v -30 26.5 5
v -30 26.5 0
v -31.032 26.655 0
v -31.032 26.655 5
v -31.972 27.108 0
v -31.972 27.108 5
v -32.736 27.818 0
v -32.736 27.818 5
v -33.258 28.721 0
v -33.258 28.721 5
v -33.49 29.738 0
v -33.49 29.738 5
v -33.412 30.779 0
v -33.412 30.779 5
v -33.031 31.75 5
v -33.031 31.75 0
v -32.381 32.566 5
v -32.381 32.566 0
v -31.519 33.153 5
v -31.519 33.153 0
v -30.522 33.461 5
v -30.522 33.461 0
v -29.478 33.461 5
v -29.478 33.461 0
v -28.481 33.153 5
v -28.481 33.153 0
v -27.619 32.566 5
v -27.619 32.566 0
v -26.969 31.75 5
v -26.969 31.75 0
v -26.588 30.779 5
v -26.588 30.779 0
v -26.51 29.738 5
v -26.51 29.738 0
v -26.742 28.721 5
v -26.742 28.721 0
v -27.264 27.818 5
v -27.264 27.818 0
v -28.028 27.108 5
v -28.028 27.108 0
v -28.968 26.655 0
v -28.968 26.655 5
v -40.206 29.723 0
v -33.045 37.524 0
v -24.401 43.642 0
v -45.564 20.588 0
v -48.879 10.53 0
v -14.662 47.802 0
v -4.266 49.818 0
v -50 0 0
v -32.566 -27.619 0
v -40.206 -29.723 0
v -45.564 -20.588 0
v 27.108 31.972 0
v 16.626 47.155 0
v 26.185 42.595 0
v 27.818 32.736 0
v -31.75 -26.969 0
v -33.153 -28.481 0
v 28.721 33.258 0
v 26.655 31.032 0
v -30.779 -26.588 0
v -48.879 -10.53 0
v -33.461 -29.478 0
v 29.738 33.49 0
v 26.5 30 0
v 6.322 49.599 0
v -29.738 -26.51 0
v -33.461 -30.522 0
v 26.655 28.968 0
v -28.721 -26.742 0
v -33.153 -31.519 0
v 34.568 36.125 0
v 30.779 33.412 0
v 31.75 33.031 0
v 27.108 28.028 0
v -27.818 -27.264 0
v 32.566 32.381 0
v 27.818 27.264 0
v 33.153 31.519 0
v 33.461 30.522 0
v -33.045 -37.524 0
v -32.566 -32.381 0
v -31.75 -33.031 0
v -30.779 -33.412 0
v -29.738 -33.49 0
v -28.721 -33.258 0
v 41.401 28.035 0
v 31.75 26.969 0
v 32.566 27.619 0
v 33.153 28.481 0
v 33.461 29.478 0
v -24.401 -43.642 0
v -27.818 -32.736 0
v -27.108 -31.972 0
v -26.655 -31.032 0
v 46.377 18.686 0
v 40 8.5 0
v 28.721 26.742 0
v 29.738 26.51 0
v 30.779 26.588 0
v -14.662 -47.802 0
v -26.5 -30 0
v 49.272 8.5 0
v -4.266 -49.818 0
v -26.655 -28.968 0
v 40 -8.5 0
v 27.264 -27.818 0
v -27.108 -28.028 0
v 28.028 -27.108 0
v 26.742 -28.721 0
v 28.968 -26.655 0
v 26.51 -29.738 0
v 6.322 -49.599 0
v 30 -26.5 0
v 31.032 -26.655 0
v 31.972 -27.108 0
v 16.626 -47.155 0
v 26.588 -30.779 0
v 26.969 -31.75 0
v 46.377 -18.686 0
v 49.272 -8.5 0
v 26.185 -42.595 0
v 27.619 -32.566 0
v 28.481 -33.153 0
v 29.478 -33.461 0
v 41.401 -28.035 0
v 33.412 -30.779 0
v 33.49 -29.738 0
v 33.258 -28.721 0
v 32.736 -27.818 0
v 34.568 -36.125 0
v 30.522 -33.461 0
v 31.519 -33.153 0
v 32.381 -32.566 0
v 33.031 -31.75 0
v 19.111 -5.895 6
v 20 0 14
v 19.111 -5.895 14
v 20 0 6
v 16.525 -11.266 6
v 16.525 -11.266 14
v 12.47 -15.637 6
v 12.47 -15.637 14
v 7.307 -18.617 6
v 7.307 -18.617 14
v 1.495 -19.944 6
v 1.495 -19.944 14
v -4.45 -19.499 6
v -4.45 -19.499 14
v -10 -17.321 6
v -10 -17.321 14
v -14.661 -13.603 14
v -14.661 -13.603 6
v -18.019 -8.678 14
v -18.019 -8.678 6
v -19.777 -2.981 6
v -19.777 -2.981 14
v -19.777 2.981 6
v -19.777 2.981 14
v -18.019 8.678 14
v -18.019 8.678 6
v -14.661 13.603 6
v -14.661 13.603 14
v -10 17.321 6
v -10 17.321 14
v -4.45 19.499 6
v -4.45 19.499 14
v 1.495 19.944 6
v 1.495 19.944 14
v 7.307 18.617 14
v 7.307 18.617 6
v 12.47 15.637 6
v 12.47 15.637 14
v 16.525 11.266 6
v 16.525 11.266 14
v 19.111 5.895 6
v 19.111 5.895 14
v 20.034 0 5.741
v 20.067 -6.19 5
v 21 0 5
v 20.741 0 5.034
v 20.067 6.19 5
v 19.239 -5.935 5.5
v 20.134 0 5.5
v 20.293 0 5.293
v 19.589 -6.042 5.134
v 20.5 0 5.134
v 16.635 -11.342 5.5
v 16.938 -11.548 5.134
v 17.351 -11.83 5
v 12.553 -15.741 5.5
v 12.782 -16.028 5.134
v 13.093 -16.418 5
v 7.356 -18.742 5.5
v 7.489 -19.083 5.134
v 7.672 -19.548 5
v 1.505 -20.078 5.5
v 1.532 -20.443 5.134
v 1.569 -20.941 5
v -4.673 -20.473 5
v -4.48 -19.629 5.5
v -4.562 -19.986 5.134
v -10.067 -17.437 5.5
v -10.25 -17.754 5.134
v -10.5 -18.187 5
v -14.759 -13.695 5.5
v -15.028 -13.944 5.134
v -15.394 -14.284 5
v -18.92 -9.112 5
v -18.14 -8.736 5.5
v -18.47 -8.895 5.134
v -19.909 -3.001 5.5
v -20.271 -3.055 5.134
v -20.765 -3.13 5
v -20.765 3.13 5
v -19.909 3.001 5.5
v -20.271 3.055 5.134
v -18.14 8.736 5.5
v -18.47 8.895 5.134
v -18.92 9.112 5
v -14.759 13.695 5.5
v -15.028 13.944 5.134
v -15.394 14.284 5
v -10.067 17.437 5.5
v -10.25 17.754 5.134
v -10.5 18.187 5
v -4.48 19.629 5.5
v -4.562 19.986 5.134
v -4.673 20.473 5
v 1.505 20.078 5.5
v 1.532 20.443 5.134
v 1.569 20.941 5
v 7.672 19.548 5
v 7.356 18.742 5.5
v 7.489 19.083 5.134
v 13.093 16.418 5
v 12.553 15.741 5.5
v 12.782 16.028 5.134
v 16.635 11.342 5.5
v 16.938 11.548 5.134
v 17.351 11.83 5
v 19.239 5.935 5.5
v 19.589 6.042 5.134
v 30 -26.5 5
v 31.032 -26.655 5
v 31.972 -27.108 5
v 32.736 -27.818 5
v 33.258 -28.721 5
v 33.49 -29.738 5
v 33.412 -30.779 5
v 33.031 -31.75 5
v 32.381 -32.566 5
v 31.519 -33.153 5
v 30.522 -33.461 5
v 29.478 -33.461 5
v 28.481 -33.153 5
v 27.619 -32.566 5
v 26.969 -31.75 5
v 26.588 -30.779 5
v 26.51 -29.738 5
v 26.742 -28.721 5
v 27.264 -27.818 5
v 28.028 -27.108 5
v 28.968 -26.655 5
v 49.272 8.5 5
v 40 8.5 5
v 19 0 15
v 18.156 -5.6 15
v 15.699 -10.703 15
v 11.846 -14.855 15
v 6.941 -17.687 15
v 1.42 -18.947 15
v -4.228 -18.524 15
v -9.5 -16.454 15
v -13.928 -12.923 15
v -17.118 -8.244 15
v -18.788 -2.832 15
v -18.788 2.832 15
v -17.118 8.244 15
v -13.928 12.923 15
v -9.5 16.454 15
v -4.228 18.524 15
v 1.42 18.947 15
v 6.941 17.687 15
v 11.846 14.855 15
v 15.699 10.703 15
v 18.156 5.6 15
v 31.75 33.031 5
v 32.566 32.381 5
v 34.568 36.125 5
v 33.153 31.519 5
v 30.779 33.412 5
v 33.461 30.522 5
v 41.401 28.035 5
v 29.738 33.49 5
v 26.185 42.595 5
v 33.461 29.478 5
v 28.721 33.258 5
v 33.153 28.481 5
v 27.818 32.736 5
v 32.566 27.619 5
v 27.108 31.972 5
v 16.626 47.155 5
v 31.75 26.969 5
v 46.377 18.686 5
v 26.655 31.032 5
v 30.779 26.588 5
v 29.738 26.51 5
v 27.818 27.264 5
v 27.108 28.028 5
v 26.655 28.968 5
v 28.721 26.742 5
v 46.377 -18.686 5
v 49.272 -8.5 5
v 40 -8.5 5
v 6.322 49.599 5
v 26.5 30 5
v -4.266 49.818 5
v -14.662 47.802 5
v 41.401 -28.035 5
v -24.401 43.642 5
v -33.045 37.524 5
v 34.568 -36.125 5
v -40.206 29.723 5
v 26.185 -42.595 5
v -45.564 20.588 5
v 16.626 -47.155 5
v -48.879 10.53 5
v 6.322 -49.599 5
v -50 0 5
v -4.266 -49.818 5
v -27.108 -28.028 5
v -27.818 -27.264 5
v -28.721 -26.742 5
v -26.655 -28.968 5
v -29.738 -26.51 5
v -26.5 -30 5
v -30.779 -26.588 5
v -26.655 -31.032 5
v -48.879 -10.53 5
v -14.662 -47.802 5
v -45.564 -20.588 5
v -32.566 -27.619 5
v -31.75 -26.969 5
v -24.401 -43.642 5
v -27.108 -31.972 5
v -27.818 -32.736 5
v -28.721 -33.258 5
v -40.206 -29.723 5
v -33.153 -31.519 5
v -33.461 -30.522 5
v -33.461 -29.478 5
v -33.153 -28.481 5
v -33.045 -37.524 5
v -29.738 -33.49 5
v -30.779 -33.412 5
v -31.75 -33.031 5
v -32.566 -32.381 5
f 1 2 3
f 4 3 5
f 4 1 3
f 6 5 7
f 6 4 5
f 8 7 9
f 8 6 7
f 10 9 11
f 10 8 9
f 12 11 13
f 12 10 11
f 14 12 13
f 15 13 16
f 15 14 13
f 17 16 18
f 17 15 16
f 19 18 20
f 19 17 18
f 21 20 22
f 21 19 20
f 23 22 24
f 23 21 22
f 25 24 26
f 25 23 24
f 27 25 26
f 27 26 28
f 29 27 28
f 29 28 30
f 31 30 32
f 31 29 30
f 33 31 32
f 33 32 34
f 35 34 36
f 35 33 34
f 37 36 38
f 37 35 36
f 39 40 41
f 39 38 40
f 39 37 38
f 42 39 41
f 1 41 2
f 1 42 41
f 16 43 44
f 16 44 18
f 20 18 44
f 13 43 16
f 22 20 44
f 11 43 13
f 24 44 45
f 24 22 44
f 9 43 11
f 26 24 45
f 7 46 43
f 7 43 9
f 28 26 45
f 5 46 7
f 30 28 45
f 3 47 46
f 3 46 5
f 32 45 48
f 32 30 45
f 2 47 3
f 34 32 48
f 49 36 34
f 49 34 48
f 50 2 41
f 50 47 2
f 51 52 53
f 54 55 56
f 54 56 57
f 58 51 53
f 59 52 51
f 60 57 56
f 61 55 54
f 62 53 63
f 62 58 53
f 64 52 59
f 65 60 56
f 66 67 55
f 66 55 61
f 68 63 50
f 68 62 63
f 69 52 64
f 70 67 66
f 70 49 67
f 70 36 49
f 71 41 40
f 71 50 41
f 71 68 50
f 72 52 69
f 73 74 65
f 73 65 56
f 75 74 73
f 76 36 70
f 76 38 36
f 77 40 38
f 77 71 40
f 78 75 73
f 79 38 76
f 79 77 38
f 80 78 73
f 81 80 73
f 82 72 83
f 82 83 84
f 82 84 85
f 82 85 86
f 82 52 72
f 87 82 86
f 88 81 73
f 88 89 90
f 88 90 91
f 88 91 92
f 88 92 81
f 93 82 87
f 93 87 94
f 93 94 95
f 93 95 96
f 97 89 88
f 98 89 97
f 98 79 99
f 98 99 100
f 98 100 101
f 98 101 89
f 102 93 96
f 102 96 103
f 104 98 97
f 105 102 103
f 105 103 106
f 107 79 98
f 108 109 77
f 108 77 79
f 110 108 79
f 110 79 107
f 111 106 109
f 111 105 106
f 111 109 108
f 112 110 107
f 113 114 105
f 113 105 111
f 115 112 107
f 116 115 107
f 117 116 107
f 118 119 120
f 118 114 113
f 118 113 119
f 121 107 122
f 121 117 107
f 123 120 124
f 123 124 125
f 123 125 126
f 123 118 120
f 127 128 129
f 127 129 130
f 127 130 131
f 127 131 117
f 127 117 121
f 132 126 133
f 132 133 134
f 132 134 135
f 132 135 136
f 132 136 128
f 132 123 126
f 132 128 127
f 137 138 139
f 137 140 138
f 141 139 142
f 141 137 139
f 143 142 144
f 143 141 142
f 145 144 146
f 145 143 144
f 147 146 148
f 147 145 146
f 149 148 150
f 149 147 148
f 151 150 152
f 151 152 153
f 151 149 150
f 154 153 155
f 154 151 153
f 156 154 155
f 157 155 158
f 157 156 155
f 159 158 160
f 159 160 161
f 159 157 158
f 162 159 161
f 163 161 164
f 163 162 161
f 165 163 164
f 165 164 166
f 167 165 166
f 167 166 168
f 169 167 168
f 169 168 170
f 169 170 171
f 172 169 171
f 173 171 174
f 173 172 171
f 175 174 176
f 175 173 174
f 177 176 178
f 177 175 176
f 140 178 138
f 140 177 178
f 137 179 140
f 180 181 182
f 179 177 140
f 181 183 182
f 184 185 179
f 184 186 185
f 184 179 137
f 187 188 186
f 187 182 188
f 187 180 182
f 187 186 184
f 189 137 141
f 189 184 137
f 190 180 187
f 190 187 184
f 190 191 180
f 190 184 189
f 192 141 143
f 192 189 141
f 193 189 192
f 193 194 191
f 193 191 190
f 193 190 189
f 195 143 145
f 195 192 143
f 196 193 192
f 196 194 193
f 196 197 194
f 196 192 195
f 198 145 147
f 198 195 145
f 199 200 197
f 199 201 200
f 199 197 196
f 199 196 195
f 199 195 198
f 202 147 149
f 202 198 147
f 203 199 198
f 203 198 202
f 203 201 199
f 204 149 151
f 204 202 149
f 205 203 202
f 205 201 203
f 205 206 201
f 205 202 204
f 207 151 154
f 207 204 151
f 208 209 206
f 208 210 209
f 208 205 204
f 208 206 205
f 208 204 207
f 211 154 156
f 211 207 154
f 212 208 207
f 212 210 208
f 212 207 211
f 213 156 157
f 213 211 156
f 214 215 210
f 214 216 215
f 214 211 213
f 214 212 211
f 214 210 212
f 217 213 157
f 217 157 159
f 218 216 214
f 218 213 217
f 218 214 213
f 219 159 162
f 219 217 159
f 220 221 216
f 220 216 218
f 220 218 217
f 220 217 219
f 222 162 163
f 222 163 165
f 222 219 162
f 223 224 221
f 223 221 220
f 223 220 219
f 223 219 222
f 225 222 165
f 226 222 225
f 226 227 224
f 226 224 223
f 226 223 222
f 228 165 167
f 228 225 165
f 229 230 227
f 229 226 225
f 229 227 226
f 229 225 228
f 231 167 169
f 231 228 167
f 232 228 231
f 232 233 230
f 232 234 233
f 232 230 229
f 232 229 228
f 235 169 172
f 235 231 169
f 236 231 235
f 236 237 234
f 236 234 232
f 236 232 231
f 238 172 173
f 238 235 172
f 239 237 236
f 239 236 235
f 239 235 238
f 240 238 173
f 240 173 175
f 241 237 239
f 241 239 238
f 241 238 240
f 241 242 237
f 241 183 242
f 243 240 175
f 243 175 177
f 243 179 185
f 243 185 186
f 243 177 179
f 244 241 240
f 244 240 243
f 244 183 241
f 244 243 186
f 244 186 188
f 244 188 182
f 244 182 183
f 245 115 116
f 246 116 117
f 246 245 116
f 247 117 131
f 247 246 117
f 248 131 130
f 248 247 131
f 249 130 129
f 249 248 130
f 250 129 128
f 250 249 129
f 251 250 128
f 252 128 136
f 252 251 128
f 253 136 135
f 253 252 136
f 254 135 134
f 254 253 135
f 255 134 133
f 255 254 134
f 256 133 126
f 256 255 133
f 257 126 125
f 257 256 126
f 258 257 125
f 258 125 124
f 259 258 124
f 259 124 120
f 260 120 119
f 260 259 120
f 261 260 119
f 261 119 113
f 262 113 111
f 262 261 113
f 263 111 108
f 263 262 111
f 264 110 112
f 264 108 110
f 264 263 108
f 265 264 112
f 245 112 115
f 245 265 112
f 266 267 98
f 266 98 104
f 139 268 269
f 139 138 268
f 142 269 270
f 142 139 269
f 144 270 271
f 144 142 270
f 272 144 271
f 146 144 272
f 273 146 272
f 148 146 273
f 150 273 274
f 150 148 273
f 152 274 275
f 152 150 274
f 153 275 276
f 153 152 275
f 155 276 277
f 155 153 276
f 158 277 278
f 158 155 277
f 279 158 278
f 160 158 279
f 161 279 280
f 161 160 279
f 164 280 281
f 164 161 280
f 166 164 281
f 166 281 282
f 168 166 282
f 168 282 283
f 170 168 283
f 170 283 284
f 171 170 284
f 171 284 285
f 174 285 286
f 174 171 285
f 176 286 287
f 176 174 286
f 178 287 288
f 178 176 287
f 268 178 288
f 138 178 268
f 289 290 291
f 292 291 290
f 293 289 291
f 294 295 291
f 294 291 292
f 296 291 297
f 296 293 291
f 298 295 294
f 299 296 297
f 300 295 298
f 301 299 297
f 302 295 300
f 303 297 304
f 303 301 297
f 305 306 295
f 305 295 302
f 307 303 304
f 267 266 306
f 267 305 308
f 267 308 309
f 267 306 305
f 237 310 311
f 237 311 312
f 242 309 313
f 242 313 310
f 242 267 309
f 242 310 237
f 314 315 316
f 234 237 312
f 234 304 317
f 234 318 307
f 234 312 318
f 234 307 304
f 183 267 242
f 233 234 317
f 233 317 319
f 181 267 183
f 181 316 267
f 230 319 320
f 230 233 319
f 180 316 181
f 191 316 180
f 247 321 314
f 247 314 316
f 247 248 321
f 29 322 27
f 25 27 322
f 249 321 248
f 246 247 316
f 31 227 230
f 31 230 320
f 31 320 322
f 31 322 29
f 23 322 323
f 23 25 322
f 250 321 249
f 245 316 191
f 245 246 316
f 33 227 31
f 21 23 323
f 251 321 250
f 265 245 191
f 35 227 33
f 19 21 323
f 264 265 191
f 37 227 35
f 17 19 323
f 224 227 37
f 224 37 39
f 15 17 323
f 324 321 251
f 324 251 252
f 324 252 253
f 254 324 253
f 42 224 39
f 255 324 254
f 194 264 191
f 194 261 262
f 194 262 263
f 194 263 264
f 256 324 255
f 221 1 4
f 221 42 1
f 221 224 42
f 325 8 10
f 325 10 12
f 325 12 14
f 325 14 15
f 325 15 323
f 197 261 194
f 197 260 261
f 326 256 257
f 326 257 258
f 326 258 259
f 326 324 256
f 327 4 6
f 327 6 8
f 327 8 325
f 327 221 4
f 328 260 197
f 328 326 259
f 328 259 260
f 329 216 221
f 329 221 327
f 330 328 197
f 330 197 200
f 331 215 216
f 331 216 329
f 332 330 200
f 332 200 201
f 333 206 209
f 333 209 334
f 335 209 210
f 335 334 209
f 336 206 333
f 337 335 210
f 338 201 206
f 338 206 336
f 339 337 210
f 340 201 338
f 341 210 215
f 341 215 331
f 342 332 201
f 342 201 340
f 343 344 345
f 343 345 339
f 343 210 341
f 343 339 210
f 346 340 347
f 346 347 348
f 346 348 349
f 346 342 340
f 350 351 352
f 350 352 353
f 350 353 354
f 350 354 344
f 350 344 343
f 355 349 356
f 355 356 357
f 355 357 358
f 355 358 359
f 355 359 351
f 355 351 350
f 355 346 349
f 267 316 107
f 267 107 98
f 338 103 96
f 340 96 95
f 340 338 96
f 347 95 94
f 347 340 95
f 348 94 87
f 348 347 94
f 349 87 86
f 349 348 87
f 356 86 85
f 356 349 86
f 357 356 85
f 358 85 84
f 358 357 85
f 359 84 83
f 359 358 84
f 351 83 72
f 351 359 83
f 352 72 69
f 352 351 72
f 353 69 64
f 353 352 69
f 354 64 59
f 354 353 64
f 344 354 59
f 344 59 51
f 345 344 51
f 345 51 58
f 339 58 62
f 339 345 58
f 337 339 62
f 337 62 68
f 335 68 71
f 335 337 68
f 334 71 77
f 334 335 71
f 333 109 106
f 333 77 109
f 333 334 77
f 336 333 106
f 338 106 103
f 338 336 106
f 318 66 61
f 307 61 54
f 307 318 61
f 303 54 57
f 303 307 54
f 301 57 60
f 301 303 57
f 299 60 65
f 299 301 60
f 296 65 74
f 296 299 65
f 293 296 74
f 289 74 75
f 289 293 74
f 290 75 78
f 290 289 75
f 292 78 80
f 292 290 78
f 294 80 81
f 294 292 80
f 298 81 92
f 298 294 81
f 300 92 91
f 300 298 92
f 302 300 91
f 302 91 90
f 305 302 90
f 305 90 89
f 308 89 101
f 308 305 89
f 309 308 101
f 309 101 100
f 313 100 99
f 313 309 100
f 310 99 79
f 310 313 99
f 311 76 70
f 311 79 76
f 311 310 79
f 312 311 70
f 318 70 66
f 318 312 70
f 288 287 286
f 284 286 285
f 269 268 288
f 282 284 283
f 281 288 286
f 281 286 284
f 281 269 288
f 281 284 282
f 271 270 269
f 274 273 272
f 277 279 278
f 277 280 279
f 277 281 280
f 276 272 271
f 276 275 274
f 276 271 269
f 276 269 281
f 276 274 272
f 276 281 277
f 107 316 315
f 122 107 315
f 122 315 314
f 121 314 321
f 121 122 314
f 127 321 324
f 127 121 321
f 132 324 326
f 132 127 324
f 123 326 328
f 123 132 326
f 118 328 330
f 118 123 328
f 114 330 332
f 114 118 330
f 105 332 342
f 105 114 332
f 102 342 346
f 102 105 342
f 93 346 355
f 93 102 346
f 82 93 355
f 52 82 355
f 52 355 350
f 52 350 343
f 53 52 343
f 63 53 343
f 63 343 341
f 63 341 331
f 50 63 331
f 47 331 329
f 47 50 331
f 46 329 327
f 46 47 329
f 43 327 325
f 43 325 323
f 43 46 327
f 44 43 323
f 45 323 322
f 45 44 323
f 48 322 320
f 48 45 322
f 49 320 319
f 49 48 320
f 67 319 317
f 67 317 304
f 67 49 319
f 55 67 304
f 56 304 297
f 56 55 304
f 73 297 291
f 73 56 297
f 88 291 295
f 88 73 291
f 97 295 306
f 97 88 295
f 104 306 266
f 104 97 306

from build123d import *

# Parameters (mm, degrees)
SKETCH5_W         = 10
SKETCH5_H         = 17
EXTRUDE2_DEPTH    = 72.414284285
CIRPATTERN1_COUNT = 4


with BuildPart() as part:
    # Sketch1 → Revolve1 (revolve)
    with BuildSketch(Plane(origin=(0, 0, 0), x_dir=(0, 0, -1), z_dir=(1, 0, 0)), mode=Mode.PRIVATE) as revolve1_sk:
        with BuildLine():
            Line((0, 0), (-15, 0))
            Line((-15, 0), (-15, 19))
            Line((-15, 19), (-14, 20))
            Line((-14, 20), (-6, 20))
            ThreePointArc((-6, 20), (-5.292893219, 20.292893219), (-5, 21))
            Line((-5, 21), (-5, 50))
            Line((-5, 50), (0, 50))
            Line((0, 50), (0, 0))
        make_face()
    revolve(revolve1_sk.sketch.rotate(Axis((0, 0, 50), (0, 0, -1)), 90), axis=Axis((0, 0, 50), (0, 0, -1)))

    # Sketch5 → Extrude2 (cut, through all)
    with BuildSketch(Plane.XY.offset(5)):
        with Locations((45, 0)):
            Rectangle(SKETCH5_W, SKETCH5_H)
    extrude(amount=-EXTRUDE2_DEPTH, mode=Mode.SUBTRACT)

    # Sketch6 → Ø7.0 (7) Diameter Hole1 (revolve, cut)
    with BuildSketch(Plane(origin=(-30, 30, 5), x_dir=(0, -1, 0), z_dir=(1, 0, 0))):
        Polygon((0, 0), (0, 12.103012167), (3.5, 10), (3.5, 0), align=None)
    f_7_0_7_diameter_hole1 = revolve(axis=Axis((-30, 30, 11.35), (0, 0, -1)), mode=Mode.SUBTRACT)

    # CirPattern1: Ø7.0 (7) Diameter Hole1 ×4 about axis
    cirpattern1_axis = Axis((0, 0, 0), (0, 0, 1))
    for i in range(1, CIRPATTERN1_COUNT):
        add(f_7_0_7_diameter_hole1.rotate(cirpattern1_axis, i * 360 / CIRPATTERN1_COUNT), mode=Mode.SUBTRACT)


solid = part.part
